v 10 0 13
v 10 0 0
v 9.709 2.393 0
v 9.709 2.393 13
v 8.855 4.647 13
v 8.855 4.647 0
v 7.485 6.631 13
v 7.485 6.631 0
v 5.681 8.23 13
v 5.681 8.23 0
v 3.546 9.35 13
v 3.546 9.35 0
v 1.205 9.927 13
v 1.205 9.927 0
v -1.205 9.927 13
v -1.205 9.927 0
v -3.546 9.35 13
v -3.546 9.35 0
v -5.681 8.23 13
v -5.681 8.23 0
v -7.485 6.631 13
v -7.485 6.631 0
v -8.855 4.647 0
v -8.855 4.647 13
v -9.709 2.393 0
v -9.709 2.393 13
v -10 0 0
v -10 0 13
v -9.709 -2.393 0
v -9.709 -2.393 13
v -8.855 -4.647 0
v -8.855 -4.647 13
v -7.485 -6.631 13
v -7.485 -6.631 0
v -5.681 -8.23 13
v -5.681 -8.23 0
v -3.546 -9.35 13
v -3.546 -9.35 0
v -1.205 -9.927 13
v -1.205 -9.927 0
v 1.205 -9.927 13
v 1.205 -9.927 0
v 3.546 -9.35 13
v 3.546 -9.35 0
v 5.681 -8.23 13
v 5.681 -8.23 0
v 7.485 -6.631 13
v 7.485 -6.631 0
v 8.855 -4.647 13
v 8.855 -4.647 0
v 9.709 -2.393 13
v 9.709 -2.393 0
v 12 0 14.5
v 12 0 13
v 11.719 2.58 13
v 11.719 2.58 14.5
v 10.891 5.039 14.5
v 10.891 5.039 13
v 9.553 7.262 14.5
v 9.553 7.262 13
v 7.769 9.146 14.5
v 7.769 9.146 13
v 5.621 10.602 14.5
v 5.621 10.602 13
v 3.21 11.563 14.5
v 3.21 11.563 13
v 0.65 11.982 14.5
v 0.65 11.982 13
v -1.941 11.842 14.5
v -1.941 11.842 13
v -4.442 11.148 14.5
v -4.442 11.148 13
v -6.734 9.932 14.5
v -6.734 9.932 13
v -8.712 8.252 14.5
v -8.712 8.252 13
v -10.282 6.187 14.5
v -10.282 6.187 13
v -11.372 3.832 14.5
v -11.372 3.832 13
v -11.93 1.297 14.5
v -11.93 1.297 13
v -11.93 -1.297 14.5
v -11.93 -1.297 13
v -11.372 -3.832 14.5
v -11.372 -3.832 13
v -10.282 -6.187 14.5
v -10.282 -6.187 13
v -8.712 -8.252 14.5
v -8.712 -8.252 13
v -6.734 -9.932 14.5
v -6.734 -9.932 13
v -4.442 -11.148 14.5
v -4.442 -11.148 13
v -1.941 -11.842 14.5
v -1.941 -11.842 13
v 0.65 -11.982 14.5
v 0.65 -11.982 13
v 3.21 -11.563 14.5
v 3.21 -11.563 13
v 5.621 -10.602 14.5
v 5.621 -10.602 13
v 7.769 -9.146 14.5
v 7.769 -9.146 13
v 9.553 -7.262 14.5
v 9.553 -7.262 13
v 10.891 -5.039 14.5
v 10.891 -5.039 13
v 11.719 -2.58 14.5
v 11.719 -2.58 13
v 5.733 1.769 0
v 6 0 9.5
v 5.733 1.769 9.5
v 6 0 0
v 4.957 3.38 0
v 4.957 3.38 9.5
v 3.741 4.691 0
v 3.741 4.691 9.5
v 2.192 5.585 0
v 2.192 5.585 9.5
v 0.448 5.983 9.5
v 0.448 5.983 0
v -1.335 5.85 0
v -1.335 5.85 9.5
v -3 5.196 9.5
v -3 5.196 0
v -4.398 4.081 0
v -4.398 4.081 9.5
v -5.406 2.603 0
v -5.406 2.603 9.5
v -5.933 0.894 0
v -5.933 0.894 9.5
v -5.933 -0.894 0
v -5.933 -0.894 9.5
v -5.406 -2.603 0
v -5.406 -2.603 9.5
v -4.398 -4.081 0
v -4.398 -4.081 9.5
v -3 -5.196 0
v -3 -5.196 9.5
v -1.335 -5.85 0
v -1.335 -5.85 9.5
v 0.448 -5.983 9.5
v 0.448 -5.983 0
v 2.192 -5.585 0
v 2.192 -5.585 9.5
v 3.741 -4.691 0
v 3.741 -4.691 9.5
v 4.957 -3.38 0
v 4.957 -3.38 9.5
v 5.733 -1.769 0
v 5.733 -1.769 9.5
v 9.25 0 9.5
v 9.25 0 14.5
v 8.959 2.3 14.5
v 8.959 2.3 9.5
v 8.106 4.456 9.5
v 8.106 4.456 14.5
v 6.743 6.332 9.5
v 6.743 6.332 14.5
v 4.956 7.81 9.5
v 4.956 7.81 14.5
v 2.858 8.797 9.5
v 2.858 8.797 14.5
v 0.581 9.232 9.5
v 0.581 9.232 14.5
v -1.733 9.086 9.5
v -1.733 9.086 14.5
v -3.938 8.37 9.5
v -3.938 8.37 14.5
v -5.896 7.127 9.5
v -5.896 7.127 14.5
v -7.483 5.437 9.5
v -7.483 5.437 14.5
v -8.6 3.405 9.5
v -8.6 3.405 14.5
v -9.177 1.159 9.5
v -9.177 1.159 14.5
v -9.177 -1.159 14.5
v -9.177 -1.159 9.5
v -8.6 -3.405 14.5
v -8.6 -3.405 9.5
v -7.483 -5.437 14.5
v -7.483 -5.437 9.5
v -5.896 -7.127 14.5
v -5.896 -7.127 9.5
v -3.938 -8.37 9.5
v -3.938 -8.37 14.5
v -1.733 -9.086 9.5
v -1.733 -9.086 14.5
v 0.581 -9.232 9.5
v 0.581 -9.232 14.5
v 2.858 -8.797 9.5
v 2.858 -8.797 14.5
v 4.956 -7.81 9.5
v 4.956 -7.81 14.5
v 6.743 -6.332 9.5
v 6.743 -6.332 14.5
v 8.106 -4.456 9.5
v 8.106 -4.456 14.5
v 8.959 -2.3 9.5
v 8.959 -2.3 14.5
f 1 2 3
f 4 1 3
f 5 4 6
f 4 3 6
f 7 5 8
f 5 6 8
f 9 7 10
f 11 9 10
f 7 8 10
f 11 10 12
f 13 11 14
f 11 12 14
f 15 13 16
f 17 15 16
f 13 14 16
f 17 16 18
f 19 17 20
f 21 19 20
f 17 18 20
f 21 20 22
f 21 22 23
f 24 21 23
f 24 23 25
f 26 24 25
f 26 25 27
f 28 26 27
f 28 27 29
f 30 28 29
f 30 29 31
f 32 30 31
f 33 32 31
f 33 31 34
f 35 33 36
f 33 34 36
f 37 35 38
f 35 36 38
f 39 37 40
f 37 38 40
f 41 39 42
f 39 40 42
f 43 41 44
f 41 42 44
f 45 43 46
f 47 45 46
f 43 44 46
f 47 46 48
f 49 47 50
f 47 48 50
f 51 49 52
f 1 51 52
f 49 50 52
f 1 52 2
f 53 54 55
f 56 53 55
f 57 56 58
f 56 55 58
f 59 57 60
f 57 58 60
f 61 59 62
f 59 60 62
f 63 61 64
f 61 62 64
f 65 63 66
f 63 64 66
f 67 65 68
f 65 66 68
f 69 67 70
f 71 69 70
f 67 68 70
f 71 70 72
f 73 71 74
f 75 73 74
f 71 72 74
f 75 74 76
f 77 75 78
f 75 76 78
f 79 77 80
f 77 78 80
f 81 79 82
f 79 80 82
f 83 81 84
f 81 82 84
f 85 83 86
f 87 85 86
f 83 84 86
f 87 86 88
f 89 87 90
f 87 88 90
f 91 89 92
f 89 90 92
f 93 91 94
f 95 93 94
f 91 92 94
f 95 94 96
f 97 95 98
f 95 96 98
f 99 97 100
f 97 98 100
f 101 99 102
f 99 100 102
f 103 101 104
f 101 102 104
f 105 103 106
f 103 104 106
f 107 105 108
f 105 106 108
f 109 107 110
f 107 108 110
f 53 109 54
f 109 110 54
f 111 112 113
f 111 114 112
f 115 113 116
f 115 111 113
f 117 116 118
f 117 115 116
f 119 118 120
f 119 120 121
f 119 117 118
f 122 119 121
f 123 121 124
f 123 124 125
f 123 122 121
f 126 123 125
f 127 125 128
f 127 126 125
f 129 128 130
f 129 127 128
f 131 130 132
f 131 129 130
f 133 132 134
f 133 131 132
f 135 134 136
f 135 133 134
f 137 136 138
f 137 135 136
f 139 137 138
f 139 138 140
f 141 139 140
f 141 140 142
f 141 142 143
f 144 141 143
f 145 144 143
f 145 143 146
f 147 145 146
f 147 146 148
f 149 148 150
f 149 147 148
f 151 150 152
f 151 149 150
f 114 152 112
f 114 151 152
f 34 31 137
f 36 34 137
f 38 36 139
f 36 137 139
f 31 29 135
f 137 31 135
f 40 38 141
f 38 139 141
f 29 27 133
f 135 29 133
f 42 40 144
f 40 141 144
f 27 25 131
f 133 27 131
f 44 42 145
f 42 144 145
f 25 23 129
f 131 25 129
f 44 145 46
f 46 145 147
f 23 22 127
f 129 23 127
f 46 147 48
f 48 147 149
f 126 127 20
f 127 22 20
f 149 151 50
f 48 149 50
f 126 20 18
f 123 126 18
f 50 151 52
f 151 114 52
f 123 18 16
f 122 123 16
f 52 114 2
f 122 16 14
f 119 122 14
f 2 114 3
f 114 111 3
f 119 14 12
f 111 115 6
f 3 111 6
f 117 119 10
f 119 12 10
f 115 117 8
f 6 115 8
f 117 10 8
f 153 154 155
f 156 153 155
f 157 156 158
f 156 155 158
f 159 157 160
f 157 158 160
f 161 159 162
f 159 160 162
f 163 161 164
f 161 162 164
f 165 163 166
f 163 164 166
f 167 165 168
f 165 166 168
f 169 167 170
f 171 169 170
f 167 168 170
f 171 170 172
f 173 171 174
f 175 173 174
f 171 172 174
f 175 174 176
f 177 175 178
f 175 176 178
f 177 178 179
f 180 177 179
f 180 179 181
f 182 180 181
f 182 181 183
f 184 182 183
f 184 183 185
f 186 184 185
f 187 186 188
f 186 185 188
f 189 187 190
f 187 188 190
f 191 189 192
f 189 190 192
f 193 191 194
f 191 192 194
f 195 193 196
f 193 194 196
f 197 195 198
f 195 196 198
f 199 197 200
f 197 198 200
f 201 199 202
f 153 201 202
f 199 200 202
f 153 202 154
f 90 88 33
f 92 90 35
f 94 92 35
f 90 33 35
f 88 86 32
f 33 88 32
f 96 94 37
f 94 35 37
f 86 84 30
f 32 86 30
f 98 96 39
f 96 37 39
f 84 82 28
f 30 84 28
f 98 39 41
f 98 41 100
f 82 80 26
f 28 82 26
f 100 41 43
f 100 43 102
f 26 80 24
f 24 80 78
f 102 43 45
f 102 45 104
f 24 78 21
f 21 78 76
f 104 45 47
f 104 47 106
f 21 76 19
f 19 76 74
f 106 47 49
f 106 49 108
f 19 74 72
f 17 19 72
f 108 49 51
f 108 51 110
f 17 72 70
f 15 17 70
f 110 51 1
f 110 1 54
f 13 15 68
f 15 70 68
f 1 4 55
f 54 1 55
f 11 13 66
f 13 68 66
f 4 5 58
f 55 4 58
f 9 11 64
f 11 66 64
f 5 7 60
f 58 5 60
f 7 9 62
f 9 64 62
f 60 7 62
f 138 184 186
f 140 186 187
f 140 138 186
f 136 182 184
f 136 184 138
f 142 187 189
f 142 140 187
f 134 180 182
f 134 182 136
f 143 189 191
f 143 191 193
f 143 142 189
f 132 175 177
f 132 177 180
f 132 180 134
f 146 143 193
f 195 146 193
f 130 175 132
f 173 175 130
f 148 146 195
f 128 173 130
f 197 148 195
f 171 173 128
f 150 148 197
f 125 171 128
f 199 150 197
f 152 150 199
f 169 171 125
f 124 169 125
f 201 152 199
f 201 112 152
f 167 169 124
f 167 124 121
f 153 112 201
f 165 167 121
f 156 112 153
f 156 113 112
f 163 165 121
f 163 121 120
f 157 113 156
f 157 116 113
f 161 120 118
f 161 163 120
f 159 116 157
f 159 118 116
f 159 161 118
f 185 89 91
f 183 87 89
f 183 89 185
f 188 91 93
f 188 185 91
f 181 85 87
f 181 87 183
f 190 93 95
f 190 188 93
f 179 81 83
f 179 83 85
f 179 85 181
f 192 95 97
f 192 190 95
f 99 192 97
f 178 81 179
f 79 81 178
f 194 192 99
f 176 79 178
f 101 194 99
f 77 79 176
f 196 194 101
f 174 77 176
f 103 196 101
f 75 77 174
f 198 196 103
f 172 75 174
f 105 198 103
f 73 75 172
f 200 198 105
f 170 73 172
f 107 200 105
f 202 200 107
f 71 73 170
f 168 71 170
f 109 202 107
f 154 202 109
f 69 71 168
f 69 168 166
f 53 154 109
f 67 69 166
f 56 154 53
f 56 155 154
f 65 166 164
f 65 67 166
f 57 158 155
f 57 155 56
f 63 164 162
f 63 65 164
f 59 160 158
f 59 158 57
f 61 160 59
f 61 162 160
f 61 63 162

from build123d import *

# Parameters (mm, degrees)
F0_R     = 10
F0_R_2   = 6
F1_DEPTH = 13
F2_R     = 12
F2_R_2   = 6
F3_DEPTH = 1.5
F4_R     = 9.25
F4_R_2   = 6
F5_DEPTH = 5


with BuildPart() as f1:
    # F0 (on Top) → F1 (new body)
    with BuildSketch(Plane.XY):
        Circle(F0_R)
        Circle(F0_R_2, mode=Mode.SUBTRACT)
    extrude(amount=F1_DEPTH)

    # F2 (on face) → F3 (join)
    with BuildSketch(Plane.XY.offset(13)):
        Circle(F2_R)
        Circle(F2_R_2, mode=Mode.SUBTRACT)
    extrude(amount=F3_DEPTH)

    # F4 (on face) → F5 (cut)
    with BuildSketch(Plane.XY.offset(14.5)):
        Circle(F4_R)
        Circle(F4_R_2, mode=Mode.SUBTRACT)
    extrude(amount=-F5_DEPTH, mode=Mode.SUBTRACT)


solid = f1.part
